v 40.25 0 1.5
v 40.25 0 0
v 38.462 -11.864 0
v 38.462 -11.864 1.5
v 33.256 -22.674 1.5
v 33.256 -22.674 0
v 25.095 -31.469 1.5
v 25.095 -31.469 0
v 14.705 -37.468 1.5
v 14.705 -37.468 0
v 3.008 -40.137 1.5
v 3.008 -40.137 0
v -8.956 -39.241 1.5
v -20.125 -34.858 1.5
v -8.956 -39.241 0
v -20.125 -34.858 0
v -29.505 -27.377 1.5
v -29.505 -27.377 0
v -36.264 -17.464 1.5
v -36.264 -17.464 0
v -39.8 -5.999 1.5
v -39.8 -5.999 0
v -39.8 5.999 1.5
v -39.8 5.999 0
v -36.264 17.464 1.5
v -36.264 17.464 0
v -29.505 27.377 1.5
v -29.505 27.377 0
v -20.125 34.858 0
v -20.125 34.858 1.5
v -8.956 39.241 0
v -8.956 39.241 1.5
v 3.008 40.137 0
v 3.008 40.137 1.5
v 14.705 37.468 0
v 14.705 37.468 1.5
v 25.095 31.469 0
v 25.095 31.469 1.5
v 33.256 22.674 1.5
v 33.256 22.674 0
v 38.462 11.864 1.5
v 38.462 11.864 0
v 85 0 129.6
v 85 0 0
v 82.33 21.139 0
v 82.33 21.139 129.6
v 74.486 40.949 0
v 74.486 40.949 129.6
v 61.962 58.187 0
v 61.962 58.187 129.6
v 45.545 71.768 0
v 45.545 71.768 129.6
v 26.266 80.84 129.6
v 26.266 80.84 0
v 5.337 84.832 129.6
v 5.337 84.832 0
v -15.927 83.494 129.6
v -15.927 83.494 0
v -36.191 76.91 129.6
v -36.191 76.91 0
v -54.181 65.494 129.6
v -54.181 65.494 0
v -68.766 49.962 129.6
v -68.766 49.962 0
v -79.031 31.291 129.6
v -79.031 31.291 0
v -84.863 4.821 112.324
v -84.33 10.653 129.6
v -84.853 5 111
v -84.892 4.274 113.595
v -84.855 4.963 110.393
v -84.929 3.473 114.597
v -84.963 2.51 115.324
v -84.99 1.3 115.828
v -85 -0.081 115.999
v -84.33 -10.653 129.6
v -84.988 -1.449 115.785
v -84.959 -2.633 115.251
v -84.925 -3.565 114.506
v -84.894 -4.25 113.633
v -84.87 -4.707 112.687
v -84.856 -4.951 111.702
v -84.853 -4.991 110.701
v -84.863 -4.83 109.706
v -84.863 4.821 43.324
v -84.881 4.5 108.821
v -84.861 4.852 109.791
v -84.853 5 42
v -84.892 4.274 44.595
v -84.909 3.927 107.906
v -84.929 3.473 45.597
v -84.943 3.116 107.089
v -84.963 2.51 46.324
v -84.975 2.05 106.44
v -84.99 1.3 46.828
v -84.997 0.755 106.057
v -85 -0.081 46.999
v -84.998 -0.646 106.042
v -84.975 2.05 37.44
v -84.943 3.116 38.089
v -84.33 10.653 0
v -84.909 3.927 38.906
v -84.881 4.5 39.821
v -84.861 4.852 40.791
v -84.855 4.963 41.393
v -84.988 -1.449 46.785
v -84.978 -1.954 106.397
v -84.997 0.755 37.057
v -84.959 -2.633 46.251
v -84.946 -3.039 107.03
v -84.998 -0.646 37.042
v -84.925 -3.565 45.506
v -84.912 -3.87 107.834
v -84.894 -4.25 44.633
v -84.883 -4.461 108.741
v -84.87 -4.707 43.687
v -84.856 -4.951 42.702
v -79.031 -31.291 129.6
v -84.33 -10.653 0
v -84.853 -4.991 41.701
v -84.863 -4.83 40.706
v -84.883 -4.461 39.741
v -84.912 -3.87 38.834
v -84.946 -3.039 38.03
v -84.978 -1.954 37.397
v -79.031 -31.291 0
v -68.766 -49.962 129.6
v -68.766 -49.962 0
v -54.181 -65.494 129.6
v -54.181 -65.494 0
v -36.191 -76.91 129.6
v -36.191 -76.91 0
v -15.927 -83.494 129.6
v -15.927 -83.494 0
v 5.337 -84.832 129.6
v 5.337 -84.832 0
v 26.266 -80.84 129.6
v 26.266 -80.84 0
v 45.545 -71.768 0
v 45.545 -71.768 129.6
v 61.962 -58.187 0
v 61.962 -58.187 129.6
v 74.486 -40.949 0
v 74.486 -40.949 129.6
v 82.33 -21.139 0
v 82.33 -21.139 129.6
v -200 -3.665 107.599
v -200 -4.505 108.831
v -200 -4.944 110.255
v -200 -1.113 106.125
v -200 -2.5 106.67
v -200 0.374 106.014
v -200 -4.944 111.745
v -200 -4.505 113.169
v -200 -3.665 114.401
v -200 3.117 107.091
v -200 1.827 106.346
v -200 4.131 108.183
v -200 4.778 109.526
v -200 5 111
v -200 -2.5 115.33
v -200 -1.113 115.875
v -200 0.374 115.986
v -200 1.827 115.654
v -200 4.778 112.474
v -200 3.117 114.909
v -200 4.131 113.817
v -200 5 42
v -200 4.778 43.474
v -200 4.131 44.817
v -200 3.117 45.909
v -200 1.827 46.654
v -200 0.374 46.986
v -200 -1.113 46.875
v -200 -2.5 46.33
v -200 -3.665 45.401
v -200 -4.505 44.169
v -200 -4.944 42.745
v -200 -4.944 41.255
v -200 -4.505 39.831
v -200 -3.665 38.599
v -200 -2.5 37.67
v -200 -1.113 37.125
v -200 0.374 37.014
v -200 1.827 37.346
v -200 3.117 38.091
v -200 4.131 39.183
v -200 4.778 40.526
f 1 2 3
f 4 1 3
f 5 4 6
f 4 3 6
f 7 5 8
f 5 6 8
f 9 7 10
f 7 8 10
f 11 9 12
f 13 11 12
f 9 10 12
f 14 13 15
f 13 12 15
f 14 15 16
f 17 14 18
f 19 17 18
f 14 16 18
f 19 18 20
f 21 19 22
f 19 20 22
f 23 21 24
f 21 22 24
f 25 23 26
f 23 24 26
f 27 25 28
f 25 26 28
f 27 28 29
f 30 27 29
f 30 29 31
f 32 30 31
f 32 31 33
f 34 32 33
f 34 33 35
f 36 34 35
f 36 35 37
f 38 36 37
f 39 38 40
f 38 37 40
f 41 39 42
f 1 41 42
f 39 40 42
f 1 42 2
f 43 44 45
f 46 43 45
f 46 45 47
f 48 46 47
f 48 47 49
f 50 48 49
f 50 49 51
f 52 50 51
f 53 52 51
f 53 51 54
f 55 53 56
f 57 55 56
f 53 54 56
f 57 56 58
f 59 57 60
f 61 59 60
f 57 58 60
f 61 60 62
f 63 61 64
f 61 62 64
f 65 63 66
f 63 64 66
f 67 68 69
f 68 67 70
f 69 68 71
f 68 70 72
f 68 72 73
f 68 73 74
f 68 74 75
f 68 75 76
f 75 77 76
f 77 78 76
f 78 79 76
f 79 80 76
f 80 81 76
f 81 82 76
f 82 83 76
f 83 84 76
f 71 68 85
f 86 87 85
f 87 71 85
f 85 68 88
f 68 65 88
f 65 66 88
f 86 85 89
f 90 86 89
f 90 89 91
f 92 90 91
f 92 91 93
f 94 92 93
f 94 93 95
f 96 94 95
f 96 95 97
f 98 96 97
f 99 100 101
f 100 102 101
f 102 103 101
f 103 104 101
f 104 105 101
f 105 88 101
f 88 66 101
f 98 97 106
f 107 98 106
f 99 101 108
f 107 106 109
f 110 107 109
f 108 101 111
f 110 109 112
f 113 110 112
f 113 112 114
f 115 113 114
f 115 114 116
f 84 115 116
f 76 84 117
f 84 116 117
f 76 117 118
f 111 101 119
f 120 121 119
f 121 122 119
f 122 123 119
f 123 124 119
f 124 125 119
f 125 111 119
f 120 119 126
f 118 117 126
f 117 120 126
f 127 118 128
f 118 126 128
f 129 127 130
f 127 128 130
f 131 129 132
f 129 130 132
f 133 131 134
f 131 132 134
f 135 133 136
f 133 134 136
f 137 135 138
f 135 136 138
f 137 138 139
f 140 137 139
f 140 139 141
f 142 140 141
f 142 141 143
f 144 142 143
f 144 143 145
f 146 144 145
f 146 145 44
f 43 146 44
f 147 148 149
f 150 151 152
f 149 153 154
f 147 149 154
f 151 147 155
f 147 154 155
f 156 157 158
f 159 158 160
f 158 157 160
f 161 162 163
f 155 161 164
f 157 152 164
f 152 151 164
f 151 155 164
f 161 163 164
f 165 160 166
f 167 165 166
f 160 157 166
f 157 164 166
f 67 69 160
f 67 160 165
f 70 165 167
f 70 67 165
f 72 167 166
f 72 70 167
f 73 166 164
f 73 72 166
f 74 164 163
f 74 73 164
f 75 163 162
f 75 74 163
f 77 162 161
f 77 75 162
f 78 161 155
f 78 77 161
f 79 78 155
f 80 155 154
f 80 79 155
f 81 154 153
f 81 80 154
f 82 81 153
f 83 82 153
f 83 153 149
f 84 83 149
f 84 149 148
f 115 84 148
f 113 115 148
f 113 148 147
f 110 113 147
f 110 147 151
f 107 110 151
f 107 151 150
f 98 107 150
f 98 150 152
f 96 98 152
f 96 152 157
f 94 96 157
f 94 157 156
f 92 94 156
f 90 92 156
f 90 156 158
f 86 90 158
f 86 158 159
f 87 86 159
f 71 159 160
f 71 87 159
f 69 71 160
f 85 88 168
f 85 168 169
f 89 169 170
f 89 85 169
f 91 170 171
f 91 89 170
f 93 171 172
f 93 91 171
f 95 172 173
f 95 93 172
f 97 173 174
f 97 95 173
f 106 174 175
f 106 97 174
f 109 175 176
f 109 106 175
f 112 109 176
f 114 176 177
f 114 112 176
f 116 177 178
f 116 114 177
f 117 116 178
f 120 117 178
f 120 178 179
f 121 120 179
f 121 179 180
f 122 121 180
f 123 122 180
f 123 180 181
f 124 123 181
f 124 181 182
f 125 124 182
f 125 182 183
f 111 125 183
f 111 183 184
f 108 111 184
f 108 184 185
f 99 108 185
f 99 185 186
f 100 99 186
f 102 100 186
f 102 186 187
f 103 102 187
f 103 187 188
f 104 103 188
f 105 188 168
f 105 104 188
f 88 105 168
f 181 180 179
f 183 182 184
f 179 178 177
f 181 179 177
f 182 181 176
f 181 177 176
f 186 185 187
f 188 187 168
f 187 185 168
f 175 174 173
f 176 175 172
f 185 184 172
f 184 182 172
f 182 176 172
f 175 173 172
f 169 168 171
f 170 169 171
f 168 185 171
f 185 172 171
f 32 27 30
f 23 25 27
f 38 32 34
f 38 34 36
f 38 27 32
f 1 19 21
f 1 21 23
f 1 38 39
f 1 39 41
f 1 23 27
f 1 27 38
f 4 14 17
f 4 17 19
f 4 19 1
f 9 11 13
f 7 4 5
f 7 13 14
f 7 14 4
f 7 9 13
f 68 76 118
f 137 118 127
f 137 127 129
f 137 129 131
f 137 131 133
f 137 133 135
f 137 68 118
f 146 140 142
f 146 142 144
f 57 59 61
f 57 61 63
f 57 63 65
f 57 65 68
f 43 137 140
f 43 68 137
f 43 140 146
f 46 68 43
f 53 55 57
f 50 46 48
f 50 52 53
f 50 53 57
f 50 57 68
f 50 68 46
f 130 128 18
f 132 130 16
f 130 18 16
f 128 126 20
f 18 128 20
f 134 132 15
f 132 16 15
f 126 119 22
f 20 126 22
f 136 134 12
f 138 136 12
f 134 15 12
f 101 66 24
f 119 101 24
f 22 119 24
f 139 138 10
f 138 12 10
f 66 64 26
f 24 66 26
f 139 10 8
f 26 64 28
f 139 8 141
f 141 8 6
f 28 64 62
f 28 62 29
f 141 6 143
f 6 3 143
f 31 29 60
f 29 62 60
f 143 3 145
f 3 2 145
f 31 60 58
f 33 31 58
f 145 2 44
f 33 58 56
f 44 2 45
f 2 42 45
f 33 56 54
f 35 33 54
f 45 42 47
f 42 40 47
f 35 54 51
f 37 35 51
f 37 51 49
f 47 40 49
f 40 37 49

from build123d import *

# Parameters (mm, degrees)
F0_R     = 85
F1_DEPTH = 129.6
F2_R     = 5
F3_DEPTH = 200
F4_R     = 40.25
F5_DEPTH = 1.5


with BuildPart() as f1:
    # F0 (on Top) → F1 (new body)
    with BuildSketch(Plane.XY):
        Circle(F0_R)
    extrude(amount=F1_DEPTH)

    # F2 (on Right) → F3 (join)
    with BuildSketch(Plane.YZ):
        with Locations((0, 42)):
            Circle(F2_R)
        with Locations((0, 111)):
            Circle(F2_R)
    extrude(amount=-F3_DEPTH)

    # F4 (on face) → F5 (cut)
    with BuildSketch(Plane(origin=(0, 0, 0), x_dir=(1, 0, 0), z_dir=(0, 0, -1))):
        Circle(F4_R)
    extrude(amount=-F5_DEPTH, mode=Mode.SUBTRACT)


solid = f1.part
